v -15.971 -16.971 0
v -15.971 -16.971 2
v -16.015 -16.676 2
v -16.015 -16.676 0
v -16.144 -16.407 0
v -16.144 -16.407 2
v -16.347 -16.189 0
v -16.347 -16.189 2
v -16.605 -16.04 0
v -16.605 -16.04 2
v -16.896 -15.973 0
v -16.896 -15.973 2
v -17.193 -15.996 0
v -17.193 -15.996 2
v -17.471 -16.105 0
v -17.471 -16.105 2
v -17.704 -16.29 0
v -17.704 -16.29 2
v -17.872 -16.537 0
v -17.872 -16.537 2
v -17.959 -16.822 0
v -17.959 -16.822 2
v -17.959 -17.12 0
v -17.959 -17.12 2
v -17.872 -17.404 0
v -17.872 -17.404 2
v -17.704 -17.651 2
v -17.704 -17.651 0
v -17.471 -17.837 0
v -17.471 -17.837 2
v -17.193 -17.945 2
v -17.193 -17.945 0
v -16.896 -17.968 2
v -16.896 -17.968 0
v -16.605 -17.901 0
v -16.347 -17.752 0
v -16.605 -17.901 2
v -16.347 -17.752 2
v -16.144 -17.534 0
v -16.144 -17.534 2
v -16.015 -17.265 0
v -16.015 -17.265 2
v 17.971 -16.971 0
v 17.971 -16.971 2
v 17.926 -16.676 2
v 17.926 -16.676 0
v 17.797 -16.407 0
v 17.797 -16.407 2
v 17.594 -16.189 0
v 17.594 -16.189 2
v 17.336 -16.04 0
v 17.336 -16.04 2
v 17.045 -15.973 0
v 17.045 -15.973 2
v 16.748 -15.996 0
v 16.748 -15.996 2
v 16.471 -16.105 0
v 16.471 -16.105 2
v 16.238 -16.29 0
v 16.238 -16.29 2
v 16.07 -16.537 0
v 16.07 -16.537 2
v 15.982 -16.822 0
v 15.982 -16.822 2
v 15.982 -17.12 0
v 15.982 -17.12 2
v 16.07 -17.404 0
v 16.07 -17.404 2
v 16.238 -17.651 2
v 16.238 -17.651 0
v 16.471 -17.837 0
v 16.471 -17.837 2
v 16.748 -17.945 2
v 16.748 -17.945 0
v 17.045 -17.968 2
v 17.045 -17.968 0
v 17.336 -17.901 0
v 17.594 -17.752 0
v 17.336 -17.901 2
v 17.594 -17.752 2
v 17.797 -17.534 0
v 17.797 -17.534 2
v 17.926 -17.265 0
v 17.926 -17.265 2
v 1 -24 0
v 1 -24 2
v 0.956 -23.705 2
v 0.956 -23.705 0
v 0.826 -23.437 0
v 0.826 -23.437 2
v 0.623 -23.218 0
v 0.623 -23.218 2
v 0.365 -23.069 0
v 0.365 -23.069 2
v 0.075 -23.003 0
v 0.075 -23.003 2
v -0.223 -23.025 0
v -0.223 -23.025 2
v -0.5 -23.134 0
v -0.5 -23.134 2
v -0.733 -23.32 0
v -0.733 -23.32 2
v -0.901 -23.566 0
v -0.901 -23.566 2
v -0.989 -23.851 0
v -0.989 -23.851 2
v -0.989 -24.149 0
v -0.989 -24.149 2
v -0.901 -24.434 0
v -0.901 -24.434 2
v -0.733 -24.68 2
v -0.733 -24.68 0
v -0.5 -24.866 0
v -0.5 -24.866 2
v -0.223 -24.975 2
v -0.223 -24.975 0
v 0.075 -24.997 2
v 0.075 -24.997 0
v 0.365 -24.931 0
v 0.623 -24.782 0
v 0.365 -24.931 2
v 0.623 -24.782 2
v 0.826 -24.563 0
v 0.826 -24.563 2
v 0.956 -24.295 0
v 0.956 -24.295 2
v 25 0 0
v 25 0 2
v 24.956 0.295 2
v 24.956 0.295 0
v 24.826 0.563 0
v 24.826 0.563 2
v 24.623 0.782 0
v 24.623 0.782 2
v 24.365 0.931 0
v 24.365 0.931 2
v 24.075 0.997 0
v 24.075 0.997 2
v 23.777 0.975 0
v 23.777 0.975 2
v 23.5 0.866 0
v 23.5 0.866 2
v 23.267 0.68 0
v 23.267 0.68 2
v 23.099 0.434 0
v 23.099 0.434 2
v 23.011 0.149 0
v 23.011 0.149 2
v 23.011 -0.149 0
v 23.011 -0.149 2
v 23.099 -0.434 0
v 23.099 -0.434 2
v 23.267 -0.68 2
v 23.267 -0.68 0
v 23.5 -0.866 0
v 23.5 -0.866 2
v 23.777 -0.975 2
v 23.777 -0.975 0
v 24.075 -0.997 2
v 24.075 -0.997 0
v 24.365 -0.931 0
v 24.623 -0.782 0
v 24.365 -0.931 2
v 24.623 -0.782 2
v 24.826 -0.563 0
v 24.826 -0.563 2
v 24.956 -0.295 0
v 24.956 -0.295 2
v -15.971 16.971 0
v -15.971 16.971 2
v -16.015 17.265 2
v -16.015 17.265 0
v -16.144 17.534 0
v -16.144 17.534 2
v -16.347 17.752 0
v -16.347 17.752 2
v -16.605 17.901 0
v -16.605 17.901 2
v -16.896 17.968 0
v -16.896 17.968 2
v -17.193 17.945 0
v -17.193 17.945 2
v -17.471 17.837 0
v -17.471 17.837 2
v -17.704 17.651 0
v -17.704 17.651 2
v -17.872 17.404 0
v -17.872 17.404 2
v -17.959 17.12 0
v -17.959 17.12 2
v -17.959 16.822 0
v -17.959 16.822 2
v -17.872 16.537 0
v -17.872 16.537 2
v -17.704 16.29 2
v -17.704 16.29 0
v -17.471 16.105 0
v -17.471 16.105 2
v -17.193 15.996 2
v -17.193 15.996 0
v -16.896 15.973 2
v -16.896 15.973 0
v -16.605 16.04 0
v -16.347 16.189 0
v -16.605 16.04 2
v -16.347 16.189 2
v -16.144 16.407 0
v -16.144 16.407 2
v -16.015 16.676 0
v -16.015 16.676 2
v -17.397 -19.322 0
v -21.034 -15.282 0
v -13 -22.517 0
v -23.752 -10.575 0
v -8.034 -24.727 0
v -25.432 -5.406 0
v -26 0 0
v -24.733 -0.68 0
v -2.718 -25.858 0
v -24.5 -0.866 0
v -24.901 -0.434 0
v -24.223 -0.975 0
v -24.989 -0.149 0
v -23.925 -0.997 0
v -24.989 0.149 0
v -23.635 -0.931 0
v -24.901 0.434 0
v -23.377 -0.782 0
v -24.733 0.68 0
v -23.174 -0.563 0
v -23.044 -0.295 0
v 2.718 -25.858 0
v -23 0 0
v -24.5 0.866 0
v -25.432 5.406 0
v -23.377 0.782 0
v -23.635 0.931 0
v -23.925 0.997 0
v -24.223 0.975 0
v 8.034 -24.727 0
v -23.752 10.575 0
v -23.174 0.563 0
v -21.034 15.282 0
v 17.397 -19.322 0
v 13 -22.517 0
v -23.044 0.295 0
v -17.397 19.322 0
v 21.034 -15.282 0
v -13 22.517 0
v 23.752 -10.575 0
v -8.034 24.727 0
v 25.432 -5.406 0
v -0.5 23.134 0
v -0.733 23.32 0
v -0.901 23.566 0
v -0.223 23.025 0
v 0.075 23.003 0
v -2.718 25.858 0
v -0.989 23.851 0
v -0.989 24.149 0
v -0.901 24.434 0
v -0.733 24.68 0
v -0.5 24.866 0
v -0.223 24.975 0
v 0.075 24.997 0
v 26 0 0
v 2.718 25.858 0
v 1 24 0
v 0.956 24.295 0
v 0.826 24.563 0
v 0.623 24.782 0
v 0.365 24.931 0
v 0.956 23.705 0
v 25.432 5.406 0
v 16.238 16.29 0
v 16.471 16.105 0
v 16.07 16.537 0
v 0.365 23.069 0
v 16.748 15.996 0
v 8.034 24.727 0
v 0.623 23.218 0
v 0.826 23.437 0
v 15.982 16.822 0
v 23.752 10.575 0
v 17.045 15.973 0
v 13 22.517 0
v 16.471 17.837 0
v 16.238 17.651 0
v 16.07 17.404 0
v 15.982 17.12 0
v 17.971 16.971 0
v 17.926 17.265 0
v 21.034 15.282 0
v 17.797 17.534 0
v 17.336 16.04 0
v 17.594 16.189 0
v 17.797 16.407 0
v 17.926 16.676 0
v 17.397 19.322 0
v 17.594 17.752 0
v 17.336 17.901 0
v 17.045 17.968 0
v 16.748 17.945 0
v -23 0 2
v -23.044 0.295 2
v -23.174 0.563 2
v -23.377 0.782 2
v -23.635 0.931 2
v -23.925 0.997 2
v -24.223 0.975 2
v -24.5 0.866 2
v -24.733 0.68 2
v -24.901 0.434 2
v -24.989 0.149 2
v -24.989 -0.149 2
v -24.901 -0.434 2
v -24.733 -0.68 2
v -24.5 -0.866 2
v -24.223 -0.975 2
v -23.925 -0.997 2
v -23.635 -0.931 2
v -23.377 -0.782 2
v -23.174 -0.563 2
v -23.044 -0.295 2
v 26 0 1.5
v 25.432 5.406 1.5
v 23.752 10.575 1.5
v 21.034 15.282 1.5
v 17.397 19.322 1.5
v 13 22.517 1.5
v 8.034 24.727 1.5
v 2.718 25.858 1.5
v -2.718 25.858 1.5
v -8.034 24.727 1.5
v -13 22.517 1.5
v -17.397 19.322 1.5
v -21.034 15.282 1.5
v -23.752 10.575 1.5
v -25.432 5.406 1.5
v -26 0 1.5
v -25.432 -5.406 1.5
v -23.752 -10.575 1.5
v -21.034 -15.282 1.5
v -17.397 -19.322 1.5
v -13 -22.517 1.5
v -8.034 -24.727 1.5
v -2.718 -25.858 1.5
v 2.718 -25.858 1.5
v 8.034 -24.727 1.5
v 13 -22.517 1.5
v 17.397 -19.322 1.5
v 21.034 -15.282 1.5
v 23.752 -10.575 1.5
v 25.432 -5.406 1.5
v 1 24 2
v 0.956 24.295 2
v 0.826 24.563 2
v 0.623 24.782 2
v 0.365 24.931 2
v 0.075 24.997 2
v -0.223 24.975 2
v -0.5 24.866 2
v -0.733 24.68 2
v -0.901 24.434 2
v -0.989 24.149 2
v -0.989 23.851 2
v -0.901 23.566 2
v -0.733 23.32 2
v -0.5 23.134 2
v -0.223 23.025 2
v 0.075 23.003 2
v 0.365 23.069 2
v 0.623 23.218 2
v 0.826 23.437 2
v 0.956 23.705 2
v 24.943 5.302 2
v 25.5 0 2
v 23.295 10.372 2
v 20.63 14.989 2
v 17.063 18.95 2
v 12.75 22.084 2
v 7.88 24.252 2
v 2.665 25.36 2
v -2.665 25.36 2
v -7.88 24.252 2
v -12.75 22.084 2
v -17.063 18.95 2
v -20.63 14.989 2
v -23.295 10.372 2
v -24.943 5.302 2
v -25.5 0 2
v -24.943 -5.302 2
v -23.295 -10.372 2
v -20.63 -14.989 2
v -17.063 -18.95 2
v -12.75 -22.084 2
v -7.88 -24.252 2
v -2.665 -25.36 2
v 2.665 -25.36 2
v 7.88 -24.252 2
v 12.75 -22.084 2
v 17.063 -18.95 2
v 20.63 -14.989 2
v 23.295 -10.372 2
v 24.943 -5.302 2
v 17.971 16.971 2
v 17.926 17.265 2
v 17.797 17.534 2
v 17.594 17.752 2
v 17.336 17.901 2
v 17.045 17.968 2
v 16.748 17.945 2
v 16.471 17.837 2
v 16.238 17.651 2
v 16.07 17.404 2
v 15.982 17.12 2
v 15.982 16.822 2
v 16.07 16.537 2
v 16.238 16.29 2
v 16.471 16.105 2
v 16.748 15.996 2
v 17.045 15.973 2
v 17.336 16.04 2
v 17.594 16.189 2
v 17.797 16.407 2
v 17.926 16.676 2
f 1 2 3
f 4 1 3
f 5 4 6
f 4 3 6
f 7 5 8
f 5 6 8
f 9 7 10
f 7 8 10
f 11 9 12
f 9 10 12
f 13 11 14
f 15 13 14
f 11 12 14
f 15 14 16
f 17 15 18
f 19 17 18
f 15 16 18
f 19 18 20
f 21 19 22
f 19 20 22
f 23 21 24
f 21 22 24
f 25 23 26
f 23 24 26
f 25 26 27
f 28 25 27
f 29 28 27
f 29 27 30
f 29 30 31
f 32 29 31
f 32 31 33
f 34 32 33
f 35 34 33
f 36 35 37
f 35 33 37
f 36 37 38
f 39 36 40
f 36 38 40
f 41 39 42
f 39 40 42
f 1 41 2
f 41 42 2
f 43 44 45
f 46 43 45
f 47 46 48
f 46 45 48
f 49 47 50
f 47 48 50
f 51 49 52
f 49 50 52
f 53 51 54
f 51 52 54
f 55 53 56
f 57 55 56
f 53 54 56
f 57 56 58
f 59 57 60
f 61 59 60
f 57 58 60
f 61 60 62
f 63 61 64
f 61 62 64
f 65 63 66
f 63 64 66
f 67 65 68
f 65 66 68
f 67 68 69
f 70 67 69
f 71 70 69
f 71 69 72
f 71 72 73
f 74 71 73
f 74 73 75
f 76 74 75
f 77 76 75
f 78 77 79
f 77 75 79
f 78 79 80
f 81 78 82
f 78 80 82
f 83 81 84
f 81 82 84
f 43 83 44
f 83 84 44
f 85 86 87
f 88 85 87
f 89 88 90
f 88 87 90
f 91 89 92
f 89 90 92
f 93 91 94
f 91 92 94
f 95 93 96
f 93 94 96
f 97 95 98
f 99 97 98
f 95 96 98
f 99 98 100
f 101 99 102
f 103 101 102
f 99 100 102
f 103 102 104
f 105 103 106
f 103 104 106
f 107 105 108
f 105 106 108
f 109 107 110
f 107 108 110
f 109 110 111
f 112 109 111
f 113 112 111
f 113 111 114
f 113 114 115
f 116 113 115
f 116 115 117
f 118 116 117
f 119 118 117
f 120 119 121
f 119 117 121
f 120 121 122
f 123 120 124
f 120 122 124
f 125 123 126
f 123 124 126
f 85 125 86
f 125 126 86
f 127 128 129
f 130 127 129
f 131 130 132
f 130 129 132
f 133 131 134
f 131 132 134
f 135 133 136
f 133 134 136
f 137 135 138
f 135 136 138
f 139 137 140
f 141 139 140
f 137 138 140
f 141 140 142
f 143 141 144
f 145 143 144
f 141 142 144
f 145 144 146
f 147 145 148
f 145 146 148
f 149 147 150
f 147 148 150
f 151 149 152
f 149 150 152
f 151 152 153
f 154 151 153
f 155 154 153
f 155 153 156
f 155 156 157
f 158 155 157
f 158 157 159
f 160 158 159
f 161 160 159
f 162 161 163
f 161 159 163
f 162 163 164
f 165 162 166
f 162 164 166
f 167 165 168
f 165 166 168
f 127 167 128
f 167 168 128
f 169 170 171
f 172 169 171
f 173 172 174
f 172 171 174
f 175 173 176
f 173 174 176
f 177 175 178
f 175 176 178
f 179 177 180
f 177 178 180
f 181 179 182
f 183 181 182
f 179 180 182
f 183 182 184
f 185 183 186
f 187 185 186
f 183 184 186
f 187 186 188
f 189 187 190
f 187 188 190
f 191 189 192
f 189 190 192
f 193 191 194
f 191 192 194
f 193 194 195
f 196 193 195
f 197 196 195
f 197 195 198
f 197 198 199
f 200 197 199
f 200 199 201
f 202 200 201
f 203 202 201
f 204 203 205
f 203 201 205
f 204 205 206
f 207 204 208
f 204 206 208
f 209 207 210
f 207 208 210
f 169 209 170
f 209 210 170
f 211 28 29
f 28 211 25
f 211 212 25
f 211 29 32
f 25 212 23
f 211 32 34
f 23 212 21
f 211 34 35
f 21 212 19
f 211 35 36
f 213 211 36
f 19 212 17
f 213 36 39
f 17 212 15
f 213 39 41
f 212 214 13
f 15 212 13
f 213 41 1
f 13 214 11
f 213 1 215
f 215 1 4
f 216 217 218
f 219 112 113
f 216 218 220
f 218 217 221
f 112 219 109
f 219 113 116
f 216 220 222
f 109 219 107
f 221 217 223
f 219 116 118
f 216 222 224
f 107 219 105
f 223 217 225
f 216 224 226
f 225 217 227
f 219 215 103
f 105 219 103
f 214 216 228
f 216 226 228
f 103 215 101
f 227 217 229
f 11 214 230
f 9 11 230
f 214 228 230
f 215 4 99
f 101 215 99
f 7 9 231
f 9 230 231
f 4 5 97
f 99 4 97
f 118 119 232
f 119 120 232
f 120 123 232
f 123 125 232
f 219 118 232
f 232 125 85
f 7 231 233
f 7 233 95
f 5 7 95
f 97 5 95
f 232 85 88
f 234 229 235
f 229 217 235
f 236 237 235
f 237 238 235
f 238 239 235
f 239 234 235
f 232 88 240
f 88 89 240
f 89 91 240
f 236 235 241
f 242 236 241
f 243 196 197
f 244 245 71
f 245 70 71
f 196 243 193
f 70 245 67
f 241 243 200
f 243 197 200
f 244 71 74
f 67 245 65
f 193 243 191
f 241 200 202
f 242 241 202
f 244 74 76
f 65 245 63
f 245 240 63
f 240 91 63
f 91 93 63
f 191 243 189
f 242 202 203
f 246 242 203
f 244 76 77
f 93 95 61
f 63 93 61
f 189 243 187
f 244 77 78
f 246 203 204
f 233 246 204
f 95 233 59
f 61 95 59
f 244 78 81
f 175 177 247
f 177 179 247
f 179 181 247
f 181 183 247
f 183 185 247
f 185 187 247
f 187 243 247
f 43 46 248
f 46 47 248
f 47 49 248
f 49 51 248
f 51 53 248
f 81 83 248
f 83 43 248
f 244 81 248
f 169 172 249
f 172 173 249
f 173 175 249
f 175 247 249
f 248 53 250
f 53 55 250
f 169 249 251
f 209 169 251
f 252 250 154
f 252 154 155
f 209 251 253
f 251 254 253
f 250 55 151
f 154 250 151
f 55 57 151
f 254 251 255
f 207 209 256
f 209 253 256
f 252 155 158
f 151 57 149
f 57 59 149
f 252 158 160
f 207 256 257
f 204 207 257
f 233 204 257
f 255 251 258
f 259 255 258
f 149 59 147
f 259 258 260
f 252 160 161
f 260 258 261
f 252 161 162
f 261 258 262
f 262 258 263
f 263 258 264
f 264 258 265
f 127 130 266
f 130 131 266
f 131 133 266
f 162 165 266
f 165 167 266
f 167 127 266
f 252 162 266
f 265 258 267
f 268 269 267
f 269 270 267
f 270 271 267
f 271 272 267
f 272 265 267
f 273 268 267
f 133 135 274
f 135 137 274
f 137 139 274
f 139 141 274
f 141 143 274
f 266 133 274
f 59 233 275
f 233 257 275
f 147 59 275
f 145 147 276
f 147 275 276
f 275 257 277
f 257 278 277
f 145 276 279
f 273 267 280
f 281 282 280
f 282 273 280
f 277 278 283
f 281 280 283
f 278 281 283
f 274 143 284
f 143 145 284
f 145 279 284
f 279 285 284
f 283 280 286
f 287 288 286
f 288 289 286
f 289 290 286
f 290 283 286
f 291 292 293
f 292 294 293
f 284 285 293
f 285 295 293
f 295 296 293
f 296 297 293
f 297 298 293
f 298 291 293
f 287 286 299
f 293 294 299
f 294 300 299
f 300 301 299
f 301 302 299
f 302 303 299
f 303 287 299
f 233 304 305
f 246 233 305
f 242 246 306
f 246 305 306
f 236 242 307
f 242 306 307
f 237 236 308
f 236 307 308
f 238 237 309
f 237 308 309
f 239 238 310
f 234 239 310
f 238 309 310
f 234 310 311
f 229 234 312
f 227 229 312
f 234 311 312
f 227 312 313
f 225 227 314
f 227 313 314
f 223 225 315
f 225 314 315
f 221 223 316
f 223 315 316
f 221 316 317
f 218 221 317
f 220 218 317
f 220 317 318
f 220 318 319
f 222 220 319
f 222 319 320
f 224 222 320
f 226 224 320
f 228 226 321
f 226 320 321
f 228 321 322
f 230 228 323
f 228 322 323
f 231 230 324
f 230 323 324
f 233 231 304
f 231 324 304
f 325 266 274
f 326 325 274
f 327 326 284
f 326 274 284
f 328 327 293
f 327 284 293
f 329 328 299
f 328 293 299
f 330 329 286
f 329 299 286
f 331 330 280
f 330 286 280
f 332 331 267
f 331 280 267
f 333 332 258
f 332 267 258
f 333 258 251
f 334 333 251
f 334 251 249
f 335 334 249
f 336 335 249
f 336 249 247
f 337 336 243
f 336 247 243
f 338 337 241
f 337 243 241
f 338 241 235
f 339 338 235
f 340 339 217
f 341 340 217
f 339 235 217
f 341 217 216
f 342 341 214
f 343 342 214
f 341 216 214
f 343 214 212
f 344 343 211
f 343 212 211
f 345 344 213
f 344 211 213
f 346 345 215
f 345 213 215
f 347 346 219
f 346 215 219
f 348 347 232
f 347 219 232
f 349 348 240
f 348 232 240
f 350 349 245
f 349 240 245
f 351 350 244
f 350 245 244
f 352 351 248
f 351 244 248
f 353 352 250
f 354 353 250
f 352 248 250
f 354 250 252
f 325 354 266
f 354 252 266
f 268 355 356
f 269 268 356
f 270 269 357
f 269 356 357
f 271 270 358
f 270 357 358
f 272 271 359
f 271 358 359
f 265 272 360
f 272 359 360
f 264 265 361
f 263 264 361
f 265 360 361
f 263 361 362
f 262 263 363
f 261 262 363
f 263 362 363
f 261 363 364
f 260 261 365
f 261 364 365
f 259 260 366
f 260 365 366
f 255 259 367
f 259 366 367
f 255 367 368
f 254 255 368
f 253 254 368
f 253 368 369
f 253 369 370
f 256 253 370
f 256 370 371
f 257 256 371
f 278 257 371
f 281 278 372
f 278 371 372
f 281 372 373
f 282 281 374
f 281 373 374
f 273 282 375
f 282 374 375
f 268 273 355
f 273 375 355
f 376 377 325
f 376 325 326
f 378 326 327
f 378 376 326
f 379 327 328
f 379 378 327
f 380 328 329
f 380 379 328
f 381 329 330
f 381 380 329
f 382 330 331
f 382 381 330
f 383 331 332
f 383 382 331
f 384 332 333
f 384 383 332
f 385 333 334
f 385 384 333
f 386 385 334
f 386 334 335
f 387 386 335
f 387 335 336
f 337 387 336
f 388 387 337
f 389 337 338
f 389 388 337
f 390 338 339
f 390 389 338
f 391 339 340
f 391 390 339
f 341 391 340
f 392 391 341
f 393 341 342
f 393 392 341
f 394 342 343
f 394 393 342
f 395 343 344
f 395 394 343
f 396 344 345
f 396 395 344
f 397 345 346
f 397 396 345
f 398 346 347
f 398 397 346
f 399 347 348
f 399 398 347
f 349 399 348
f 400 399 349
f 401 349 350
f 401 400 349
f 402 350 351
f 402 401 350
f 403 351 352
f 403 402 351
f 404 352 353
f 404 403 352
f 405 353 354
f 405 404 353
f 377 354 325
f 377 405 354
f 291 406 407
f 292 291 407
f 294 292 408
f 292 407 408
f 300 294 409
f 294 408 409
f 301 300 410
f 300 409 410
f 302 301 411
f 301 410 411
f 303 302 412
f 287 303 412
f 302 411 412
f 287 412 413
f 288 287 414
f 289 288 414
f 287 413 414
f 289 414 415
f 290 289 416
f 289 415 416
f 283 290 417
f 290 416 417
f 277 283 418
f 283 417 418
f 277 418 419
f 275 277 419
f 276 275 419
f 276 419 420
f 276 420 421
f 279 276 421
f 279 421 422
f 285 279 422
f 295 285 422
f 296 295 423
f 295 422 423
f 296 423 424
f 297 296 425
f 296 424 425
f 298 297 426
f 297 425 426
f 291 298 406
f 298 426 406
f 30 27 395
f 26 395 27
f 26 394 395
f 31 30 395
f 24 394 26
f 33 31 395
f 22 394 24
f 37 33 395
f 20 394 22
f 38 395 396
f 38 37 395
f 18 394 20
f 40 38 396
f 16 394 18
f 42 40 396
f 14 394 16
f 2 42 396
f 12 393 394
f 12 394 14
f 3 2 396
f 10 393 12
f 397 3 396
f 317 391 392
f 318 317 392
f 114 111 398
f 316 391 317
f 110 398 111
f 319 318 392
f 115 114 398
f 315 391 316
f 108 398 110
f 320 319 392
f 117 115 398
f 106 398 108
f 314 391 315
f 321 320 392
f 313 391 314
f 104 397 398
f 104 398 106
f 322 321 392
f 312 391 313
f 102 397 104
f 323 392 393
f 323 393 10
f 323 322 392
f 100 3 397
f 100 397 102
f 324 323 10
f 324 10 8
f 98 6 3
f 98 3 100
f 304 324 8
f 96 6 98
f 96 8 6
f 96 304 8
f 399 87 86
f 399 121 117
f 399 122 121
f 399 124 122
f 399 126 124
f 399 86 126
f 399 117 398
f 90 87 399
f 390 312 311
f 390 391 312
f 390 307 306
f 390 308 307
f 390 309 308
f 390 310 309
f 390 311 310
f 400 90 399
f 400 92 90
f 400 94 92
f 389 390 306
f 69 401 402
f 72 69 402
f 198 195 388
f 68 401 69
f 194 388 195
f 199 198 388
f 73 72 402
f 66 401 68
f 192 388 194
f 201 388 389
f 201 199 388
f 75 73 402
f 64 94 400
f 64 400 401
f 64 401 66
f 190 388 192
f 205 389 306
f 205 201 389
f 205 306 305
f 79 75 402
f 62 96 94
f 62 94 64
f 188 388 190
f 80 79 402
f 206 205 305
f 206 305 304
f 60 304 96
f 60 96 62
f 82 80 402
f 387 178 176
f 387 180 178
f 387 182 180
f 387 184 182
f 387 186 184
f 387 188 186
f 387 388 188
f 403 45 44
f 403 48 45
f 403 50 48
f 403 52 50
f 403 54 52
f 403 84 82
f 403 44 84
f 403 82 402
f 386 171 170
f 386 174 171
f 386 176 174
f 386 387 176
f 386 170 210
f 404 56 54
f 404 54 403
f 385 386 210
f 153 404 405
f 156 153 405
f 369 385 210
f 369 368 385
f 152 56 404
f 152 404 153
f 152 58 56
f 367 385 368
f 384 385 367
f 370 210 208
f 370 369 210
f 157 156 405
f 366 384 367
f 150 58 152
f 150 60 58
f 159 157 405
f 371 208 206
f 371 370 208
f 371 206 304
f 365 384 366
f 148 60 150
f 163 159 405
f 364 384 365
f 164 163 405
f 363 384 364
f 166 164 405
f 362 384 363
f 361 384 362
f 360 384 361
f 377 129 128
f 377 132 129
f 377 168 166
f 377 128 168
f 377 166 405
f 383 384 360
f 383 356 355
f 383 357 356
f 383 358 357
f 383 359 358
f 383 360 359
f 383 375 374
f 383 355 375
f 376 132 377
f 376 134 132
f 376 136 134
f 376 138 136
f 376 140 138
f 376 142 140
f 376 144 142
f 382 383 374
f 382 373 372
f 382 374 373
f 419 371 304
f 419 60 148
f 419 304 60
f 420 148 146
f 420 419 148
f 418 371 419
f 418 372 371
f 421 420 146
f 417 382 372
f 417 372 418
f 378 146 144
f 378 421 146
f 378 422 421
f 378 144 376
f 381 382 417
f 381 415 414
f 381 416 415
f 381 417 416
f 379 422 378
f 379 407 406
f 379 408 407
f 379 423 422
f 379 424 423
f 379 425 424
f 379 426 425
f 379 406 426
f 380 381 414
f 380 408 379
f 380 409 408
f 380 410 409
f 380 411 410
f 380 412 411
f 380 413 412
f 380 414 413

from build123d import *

# Parameters (mm, degrees)
SKETCH_1_R          = 26
EXTRUDE_1_DEPTH     = 2
SKETCH_2_R          = 1
CUT_EXTRUDE_1_DEPTH = 2
CHAMFER_2_SIZE      = 0.5


with BuildPart() as part:
    # Эскиз1 → Бобышка-Вытянуть1 (new body)
    with BuildSketch(Plane.XY):
        Circle(SKETCH_1_R)
    extrude(amount=EXTRUDE_1_DEPTH)

    # Эскиз2 → Вырез-Вытянуть1 (cut)
    with BuildSketch(Plane.XY.offset(2)):
        with Locations((0, 24)):
            Circle(SKETCH_2_R)
        with Locations((16.970562748, 16.970562748)):
            Circle(SKETCH_2_R)
        with Locations((24, 0)):
            Circle(SKETCH_2_R)
        with Locations((16.970562748, -16.970562748)):
            Circle(SKETCH_2_R)
        with Locations((0, -24)):
            Circle(SKETCH_2_R)
        with Locations((-16.970562748, -16.970562748)):
            Circle(SKETCH_2_R)
        with Locations((-24, 0)):
            Circle(SKETCH_2_R)
        with Locations((-16.970562748, 16.970562748)):
            Circle(SKETCH_2_R)
    extrude(amount=-CUT_EXTRUDE_1_DEPTH, mode=Mode.SUBTRACT)

    # Фаска2
    chamfer_2_edges = [part.edges().sort_by_distance(p)[0] for p in [
        (-26, 0, 2),
    ]]
    chamfer(chamfer_2_edges, length=CHAMFER_2_SIZE)


solid = part.part
